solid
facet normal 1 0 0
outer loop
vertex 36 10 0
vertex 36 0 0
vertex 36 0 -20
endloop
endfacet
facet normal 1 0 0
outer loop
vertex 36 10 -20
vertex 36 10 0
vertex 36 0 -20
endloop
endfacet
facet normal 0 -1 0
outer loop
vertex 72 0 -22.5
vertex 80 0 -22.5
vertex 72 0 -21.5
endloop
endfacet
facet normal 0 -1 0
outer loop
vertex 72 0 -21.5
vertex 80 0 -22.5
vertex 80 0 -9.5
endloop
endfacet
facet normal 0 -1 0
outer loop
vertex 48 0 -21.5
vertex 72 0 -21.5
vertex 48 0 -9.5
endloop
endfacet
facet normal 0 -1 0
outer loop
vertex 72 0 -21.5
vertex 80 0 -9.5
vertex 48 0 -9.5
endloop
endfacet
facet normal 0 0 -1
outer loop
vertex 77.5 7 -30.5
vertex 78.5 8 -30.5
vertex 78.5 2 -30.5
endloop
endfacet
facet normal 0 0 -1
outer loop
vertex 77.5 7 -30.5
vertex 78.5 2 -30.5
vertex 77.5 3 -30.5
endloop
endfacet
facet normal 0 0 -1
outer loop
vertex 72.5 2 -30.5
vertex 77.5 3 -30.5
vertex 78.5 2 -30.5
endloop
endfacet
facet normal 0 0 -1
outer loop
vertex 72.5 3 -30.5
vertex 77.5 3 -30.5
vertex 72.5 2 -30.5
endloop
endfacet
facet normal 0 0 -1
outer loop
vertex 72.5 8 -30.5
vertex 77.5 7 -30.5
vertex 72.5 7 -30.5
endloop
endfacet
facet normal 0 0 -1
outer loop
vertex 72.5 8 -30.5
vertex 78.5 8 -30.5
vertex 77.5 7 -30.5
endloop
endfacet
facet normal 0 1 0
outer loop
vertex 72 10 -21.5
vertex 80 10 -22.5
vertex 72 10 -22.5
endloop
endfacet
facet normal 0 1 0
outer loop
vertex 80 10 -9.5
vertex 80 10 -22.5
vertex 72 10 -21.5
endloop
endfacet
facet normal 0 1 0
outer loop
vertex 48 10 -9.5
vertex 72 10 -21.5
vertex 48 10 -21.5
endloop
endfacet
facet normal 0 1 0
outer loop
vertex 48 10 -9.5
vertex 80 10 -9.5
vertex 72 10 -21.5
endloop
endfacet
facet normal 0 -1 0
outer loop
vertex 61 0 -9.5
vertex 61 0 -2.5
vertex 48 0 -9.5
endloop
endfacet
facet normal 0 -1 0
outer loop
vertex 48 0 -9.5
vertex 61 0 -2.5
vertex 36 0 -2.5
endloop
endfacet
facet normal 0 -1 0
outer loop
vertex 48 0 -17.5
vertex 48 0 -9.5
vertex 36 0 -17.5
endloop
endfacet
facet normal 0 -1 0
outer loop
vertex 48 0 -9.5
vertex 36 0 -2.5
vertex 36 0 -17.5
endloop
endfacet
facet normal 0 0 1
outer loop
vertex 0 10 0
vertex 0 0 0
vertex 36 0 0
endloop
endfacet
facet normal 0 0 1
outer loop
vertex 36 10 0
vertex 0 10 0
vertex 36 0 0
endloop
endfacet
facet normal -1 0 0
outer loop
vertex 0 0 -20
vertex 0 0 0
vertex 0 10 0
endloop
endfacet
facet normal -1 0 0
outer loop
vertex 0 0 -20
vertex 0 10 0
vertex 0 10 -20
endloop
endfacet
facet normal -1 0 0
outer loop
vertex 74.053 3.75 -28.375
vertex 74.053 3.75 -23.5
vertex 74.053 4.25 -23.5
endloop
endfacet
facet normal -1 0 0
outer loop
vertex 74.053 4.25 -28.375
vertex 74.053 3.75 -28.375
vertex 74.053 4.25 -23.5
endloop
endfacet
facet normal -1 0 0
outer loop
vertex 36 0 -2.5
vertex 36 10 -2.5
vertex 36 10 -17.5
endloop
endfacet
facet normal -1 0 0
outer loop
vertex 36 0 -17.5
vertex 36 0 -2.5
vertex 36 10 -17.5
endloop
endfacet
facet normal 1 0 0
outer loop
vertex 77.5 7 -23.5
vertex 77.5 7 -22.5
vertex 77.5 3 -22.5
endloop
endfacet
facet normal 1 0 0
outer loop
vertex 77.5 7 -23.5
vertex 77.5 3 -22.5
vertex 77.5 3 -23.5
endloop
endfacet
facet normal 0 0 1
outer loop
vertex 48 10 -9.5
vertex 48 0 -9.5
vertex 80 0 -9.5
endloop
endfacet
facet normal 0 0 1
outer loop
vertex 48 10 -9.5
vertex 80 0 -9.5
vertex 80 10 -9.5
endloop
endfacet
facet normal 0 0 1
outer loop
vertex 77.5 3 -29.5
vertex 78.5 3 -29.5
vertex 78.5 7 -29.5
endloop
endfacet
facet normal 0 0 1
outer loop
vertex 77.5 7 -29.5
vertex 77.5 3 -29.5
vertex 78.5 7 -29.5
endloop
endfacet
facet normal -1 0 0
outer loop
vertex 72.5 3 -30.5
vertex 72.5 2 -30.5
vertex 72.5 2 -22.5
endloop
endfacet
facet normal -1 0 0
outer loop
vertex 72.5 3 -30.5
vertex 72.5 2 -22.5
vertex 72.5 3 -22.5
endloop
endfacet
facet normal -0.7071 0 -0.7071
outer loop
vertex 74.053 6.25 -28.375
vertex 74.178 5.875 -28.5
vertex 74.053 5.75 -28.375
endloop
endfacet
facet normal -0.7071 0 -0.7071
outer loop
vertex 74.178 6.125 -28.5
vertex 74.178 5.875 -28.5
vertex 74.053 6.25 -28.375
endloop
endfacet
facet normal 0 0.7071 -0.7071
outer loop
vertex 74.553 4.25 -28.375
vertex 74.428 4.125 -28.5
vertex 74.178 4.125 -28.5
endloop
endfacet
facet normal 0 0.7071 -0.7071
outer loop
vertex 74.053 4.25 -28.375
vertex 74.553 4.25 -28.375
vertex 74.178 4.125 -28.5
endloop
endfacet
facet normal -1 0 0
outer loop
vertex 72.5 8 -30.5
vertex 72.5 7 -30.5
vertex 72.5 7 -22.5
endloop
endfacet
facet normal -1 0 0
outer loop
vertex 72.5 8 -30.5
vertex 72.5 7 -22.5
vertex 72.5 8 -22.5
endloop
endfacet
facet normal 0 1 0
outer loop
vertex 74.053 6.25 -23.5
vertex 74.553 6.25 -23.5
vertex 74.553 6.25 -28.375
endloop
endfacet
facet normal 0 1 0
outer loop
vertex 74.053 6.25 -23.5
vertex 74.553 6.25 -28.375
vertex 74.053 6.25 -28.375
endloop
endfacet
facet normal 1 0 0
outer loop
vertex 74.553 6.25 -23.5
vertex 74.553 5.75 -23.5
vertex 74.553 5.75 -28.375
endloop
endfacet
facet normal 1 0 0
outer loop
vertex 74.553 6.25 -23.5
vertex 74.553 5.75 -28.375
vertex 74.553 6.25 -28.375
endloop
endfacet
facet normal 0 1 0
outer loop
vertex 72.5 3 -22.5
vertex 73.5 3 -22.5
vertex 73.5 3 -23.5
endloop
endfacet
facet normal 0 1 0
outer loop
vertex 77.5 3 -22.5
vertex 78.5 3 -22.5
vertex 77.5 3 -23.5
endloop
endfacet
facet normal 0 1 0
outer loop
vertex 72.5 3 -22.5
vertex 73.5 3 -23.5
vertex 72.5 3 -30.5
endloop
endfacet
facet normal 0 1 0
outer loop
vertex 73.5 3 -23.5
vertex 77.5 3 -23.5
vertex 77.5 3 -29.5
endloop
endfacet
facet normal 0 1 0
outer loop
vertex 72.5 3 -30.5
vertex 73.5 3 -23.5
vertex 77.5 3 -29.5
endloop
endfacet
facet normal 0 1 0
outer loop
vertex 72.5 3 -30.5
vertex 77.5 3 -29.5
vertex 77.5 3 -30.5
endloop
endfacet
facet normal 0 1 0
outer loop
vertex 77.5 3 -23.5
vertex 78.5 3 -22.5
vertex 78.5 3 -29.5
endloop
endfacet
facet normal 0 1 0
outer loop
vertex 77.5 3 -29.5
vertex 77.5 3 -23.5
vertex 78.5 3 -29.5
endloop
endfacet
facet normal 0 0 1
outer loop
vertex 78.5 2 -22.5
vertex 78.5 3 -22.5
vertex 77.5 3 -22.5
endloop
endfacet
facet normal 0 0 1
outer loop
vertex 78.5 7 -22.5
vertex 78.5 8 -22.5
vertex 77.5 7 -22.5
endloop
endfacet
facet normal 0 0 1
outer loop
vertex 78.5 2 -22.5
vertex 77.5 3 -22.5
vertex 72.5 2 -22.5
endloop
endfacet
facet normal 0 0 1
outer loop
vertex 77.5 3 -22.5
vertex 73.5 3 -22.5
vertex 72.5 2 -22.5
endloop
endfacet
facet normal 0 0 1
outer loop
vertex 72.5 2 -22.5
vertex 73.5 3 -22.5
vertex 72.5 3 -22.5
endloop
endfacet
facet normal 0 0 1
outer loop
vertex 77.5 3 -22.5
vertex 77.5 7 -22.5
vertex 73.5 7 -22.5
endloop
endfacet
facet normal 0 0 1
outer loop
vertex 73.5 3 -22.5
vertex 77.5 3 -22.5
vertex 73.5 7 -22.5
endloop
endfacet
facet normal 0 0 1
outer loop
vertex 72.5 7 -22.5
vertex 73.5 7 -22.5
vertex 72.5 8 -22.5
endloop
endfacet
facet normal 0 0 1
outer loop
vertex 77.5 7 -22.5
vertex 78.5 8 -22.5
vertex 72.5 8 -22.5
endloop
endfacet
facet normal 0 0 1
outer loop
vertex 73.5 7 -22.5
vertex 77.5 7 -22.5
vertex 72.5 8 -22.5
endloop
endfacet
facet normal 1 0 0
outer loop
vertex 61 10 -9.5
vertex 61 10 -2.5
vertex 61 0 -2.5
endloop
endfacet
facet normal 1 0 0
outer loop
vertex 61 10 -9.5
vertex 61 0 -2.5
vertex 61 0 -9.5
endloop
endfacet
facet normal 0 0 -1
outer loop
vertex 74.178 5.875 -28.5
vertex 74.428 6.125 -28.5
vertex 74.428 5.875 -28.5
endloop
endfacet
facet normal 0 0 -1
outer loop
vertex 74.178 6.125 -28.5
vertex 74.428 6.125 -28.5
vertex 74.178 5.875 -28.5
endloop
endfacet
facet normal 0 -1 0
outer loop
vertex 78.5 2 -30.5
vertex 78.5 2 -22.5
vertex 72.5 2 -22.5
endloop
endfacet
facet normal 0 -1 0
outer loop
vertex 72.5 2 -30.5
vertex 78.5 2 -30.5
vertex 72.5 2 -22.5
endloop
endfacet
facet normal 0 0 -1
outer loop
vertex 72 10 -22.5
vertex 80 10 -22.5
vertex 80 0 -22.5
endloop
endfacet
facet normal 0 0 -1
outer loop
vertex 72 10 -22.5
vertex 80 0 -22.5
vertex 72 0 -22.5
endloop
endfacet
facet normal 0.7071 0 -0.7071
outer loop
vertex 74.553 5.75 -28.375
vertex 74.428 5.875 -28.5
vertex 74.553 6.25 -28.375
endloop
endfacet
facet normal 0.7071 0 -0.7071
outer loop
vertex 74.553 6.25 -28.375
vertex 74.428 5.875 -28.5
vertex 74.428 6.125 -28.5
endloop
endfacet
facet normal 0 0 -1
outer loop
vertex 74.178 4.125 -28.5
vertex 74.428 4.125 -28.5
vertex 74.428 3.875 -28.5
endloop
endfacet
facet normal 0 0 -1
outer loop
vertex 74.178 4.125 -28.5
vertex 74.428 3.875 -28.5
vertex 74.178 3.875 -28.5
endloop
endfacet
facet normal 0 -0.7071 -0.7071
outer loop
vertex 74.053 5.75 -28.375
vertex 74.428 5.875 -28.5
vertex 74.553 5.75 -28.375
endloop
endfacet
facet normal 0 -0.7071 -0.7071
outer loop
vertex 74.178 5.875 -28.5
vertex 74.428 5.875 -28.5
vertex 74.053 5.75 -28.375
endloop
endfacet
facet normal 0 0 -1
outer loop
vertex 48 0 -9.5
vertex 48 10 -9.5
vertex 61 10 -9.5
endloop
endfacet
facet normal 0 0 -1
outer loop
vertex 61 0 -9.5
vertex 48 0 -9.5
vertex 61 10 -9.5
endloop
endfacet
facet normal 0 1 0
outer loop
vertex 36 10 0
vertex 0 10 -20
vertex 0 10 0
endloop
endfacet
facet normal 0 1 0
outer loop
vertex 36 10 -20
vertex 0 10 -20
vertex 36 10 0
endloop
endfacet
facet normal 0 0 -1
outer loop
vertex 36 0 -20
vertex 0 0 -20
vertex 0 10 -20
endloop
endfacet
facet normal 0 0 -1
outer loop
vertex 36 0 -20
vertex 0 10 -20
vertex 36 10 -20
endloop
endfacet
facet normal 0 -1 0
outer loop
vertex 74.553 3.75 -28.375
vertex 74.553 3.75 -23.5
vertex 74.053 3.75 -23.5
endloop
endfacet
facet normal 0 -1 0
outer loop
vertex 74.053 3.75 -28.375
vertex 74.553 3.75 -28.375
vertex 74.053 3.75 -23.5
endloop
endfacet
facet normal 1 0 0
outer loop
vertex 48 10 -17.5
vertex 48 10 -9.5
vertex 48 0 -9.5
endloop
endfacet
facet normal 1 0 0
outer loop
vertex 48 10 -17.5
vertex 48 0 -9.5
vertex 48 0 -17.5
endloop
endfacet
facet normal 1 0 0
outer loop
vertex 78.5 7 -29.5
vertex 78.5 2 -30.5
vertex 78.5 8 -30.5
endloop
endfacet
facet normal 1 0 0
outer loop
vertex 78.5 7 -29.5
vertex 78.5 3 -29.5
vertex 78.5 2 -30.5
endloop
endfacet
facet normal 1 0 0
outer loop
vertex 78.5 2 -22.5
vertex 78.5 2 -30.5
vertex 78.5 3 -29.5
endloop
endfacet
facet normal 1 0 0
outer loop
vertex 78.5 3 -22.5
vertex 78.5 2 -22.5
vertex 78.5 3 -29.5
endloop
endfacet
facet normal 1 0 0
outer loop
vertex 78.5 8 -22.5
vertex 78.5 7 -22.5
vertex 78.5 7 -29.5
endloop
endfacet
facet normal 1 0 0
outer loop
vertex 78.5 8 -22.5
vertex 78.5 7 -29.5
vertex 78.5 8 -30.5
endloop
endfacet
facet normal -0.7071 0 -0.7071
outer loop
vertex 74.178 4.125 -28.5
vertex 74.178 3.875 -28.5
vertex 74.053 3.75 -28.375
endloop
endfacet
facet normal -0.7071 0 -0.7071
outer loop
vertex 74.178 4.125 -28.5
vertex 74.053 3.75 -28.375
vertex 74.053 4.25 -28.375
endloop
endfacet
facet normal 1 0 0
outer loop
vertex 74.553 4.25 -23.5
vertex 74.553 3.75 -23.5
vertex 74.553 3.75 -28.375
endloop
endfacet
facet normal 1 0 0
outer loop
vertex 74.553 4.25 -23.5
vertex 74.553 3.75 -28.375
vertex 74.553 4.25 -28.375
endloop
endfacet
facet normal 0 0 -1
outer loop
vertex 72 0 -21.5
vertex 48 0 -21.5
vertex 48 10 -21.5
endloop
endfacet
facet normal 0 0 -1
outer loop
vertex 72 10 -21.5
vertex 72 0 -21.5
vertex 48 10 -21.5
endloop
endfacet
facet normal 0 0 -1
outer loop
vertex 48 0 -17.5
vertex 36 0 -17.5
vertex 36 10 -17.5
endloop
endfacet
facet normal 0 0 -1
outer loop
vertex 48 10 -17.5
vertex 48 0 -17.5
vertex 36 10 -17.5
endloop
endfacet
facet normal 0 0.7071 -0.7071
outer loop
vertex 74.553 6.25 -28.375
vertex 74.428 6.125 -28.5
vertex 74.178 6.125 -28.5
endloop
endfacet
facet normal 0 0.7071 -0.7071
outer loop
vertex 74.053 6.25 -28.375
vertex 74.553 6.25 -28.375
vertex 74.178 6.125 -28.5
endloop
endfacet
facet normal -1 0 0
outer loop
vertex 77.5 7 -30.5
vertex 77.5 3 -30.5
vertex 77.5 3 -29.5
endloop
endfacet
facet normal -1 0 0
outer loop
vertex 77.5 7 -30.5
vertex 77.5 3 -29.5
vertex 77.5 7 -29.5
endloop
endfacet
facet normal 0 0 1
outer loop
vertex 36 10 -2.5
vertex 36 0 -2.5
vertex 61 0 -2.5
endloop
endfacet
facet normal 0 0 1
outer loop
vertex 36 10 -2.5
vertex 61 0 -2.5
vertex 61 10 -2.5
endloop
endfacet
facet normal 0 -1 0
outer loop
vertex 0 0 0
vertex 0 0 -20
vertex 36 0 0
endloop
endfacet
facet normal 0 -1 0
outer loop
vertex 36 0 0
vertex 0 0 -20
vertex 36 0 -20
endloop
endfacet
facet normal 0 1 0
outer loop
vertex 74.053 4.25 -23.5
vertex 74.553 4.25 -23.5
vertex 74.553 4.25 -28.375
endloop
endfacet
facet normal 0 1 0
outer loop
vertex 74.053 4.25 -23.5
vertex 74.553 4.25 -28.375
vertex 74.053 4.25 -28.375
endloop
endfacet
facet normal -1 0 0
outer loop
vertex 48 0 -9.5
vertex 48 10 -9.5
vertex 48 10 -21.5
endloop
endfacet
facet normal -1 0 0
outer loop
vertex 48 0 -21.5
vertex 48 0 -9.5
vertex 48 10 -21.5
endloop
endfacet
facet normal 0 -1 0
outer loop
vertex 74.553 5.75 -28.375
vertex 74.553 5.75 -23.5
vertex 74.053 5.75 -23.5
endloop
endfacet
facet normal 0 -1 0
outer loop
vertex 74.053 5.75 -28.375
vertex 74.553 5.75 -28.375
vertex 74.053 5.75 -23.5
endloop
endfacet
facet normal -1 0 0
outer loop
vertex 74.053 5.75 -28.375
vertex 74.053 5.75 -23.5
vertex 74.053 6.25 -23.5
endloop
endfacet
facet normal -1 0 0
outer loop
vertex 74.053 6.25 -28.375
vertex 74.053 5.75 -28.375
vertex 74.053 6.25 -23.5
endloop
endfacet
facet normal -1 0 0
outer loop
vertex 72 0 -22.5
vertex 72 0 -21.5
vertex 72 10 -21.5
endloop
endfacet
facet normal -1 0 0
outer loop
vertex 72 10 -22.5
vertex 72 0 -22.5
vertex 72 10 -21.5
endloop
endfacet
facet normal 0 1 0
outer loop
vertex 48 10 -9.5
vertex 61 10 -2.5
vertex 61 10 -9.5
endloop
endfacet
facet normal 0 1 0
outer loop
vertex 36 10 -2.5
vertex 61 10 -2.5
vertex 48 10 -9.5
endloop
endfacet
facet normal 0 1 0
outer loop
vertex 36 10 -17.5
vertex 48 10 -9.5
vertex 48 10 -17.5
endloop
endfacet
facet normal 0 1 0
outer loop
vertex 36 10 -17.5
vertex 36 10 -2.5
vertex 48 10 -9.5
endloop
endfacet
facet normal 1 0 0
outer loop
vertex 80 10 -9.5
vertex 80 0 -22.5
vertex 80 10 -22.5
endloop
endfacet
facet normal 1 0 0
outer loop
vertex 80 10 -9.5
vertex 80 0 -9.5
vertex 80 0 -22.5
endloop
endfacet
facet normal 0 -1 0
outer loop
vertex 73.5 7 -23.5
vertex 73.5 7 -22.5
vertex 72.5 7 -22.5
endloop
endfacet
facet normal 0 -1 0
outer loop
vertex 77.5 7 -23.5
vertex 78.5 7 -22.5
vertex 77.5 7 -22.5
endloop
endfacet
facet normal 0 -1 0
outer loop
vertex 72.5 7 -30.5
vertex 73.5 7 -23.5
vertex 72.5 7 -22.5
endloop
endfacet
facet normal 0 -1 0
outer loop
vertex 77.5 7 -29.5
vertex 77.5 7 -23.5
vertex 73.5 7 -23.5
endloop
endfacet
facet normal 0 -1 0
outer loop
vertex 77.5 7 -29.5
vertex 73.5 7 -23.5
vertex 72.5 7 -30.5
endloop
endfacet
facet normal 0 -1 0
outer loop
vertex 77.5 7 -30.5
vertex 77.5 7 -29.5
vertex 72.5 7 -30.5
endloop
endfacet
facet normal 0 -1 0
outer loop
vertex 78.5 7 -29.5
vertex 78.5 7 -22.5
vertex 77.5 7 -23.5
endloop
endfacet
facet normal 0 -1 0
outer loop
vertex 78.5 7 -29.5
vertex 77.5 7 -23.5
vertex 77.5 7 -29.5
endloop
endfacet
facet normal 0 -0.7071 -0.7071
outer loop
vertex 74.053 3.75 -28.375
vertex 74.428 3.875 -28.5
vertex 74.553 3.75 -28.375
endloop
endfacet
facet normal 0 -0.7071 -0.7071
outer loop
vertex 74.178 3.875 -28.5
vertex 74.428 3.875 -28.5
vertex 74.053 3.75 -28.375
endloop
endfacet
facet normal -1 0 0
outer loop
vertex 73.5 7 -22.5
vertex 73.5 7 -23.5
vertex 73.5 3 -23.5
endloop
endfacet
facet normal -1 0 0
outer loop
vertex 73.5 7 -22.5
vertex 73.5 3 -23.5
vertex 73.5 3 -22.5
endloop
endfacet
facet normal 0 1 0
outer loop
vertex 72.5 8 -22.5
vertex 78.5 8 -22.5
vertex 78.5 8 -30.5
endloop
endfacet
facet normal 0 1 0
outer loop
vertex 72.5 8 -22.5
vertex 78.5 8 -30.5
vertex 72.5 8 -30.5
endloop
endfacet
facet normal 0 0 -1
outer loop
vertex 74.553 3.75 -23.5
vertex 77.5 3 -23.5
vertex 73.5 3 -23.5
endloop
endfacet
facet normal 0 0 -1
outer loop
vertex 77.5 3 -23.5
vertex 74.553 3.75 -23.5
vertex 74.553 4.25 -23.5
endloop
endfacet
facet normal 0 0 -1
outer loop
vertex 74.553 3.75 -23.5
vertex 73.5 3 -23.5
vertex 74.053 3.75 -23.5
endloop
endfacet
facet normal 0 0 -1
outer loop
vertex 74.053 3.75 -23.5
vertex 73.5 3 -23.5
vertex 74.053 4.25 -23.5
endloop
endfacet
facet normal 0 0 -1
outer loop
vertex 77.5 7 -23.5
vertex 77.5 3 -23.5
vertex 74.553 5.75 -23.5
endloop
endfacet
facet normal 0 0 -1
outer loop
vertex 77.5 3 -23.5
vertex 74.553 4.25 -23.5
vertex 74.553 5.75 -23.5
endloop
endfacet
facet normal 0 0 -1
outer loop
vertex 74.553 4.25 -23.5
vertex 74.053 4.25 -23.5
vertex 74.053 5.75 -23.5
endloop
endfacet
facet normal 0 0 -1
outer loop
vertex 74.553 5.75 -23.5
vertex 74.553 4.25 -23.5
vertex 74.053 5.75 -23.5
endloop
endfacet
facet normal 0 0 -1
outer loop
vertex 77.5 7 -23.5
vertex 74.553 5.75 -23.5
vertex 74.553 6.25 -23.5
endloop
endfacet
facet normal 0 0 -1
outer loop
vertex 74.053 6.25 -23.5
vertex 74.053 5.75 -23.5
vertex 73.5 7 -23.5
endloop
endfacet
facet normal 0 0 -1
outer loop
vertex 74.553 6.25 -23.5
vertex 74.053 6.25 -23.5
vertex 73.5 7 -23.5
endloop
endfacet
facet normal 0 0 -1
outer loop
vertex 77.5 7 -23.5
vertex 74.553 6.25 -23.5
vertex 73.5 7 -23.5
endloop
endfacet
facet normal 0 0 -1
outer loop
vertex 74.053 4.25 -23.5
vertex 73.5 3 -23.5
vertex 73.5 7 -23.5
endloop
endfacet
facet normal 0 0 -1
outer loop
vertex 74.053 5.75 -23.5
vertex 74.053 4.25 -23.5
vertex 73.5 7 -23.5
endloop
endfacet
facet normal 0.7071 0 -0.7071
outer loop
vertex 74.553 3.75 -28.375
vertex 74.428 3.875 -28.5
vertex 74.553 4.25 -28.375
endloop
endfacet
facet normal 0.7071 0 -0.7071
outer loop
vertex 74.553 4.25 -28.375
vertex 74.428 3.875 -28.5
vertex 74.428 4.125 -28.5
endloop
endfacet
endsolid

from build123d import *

# Parameters (mm, degrees)
SKETCH1_W           = 36
SKETCH1_H           = 20
BOSS_EXTRUDE1_DEPTH = 10
SKETCH2_W           = 15
SKETCH2_H           = 10
BOSS_EXTRUDE2_DEPTH = 25
SKETCH3_W           = 13
SKETCH3_H           = 13.907546289
CUT_EXTRUDE1_DEPTH  = 25
SKETCH4_W           = 12
SKETCH4_H           = 10
BOSS_EXTRUDE3_DEPTH = 32
SKETCH5_W           = 8
SKETCH5_H           = 10
BOSS_EXTRUDE4_DEPTH = 1
SKETCH6_W           = 6
SKETCH6_H           = 6
BOSS_EXTRUDE5_DEPTH = 8
SHELL2_START        = 73.5
SHELL2_OUTLINE_W    = 4
SHELL2_OUTLINE_H    = 6
SHELL2_DEPTH        = 4
SKETCH7_W           = 7
SKETCH7_H           = 4
CUT_EXTRUDE2_DEPTH  = 1
SKETCH8_W           = 8
SKETCH8_H           = 4
CUT_EXTRUDE3_DEPTH  = 1
SKETCH9_W           = 4
SKETCH9_H           = 4
CUT_EXTRUDE4_DEPTH  = 1
SKETCH10_W          = 0.5
SKETCH10_H          = 0.5
BOSS_EXTRUDE6_DEPTH = 5
CHAMFER1_SIZE       = 0.125


# Read off the part's stored shape, not the designer's step: Shell2
with BuildPart() as part:
    # Sketch1 → Boss-Extrude1 (new body)
    with BuildSketch(Plane(origin=(0, 0, 0), x_dir=(1, 0, 0), z_dir=(0, 1, 0))):
        with Locations((18, 10)):
            Rectangle(SKETCH1_W, SKETCH1_H)
    extrude(amount=BOSS_EXTRUDE1_DEPTH)


with BuildPart() as body_2:
    # Sketch2 → Boss-Extrude2 (new body)
    with BuildSketch(Plane(origin=(36, 0, 0), x_dir=(0, 0, -1), z_dir=(1, 0, 0))):
        with Locations((10, 5)):
            Rectangle(SKETCH2_W, SKETCH2_H)
    extrude(amount=BOSS_EXTRUDE2_DEPTH)

    # Sketch3 → Cut-Extrude1 (cut)
    with BuildSketch(Plane(origin=(0, 10, 0), x_dir=(1, 0, 0), z_dir=(0, 1, 0))):
        with Locations((54.5, 16.453773145)):
            Rectangle(SKETCH3_W, SKETCH3_H)
    extrude(amount=-CUT_EXTRUDE1_DEPTH, mode=Mode.SUBTRACT)


with BuildPart() as body_3:
    # Sketch4 → Boss-Extrude3 (new body)
    with BuildSketch(Plane(origin=(48, 0, 0), x_dir=(0, 0, -1), z_dir=(1, 0, 0))):
        with Locations((15.5, 5)):
            Rectangle(SKETCH4_W, SKETCH4_H)
    extrude(amount=BOSS_EXTRUDE3_DEPTH)

    # Sketch5 → Boss-Extrude4 (add)
    with BuildSketch(Plane(origin=(0, 0, -21.5), x_dir=(-1, 0, 0), z_dir=(0, 0, -1))):
        with Locations((-76, 5)):
            Rectangle(SKETCH5_W, SKETCH5_H)
    extrude(amount=BOSS_EXTRUDE4_DEPTH)


with BuildPart() as body_4:
    # Sketch6 → Boss-Extrude5 (new body)
    with BuildSketch(Plane(origin=(0, 0, -22.5), x_dir=(-1, 0, 0), z_dir=(0, 0, -1))):
        with Locations((-75.5, 5)):
            Rectangle(SKETCH6_W, SKETCH6_H)
    extrude(amount=BOSS_EXTRUDE5_DEPTH)

    # Shell2 outline → Shell2 (cut)
    with BuildSketch(Plane.YZ.offset(SHELL2_START)):
        with Locations((5, -26.5)):
            Rectangle(SHELL2_OUTLINE_W, SHELL2_OUTLINE_H)
    extrude(amount=SHELL2_DEPTH, mode=Mode.SUBTRACT)

    # Sketch7 → Cut-Extrude2 (cut)
    with BuildSketch(Plane(origin=(78.5, 0, 0), x_dir=(0, 0, -1), z_dir=(1, 0, 0))):
        with Locations((26, 5)):
            Rectangle(SKETCH7_W, SKETCH7_H)
    extrude(amount=-CUT_EXTRUDE2_DEPTH, mode=Mode.SUBTRACT)

    # Sketch8 → Cut-Extrude3 (cut)
    with BuildSketch(Plane.ZY.offset(-72.5)):
        with Locations((-26.5, 5)):
            Rectangle(SKETCH8_W, SKETCH8_H)
    extrude(amount=-CUT_EXTRUDE3_DEPTH, mode=Mode.SUBTRACT)

    # Sketch9 → Cut-Extrude4 (cut)
    with BuildSketch(Plane(origin=(0, 0, -30.5), x_dir=(-1, 0, 0), z_dir=(0, 0, -1))):
        with Locations((-75.5, 5)):
            Rectangle(SKETCH9_W, SKETCH9_H)
    extrude(amount=-CUT_EXTRUDE4_DEPTH, mode=Mode.SUBTRACT)

    # Sketch10 → Boss-Extrude6 (add)
    with BuildSketch(Plane(origin=(0, 0, -23.5), x_dir=(-1, 0, 0), z_dir=(0, 0, -1))):
        with Locations((-74.302997824, 6)):
            Rectangle(SKETCH10_W, SKETCH10_H)
        with Locations((-74.302997824, 4)):
            Rectangle(SKETCH10_W, SKETCH10_H)
    extrude(amount=BOSS_EXTRUDE6_DEPTH)

    # Chamfer1
    chamfer1_edges = [body_4.edges().sort_by_distance(p)[0] for p in [
        (74.552997824, 6, -28.5),
        (74.302997824, 5.75, -28.5),
        (74.052997824, 6, -28.5),
        (74.302997824, 6.25, -28.5),
        (74.552997824, 4, -28.5),
        (74.302997824, 3.75, -28.5),
        (74.052997824, 4, -28.5),
        (74.302997824, 4.25, -28.5),
    ]]
    chamfer(chamfer1_edges, length=CHAMFER1_SIZE)


solid = Compound([part.part, body_2.part, body_3.part, body_4.part])
